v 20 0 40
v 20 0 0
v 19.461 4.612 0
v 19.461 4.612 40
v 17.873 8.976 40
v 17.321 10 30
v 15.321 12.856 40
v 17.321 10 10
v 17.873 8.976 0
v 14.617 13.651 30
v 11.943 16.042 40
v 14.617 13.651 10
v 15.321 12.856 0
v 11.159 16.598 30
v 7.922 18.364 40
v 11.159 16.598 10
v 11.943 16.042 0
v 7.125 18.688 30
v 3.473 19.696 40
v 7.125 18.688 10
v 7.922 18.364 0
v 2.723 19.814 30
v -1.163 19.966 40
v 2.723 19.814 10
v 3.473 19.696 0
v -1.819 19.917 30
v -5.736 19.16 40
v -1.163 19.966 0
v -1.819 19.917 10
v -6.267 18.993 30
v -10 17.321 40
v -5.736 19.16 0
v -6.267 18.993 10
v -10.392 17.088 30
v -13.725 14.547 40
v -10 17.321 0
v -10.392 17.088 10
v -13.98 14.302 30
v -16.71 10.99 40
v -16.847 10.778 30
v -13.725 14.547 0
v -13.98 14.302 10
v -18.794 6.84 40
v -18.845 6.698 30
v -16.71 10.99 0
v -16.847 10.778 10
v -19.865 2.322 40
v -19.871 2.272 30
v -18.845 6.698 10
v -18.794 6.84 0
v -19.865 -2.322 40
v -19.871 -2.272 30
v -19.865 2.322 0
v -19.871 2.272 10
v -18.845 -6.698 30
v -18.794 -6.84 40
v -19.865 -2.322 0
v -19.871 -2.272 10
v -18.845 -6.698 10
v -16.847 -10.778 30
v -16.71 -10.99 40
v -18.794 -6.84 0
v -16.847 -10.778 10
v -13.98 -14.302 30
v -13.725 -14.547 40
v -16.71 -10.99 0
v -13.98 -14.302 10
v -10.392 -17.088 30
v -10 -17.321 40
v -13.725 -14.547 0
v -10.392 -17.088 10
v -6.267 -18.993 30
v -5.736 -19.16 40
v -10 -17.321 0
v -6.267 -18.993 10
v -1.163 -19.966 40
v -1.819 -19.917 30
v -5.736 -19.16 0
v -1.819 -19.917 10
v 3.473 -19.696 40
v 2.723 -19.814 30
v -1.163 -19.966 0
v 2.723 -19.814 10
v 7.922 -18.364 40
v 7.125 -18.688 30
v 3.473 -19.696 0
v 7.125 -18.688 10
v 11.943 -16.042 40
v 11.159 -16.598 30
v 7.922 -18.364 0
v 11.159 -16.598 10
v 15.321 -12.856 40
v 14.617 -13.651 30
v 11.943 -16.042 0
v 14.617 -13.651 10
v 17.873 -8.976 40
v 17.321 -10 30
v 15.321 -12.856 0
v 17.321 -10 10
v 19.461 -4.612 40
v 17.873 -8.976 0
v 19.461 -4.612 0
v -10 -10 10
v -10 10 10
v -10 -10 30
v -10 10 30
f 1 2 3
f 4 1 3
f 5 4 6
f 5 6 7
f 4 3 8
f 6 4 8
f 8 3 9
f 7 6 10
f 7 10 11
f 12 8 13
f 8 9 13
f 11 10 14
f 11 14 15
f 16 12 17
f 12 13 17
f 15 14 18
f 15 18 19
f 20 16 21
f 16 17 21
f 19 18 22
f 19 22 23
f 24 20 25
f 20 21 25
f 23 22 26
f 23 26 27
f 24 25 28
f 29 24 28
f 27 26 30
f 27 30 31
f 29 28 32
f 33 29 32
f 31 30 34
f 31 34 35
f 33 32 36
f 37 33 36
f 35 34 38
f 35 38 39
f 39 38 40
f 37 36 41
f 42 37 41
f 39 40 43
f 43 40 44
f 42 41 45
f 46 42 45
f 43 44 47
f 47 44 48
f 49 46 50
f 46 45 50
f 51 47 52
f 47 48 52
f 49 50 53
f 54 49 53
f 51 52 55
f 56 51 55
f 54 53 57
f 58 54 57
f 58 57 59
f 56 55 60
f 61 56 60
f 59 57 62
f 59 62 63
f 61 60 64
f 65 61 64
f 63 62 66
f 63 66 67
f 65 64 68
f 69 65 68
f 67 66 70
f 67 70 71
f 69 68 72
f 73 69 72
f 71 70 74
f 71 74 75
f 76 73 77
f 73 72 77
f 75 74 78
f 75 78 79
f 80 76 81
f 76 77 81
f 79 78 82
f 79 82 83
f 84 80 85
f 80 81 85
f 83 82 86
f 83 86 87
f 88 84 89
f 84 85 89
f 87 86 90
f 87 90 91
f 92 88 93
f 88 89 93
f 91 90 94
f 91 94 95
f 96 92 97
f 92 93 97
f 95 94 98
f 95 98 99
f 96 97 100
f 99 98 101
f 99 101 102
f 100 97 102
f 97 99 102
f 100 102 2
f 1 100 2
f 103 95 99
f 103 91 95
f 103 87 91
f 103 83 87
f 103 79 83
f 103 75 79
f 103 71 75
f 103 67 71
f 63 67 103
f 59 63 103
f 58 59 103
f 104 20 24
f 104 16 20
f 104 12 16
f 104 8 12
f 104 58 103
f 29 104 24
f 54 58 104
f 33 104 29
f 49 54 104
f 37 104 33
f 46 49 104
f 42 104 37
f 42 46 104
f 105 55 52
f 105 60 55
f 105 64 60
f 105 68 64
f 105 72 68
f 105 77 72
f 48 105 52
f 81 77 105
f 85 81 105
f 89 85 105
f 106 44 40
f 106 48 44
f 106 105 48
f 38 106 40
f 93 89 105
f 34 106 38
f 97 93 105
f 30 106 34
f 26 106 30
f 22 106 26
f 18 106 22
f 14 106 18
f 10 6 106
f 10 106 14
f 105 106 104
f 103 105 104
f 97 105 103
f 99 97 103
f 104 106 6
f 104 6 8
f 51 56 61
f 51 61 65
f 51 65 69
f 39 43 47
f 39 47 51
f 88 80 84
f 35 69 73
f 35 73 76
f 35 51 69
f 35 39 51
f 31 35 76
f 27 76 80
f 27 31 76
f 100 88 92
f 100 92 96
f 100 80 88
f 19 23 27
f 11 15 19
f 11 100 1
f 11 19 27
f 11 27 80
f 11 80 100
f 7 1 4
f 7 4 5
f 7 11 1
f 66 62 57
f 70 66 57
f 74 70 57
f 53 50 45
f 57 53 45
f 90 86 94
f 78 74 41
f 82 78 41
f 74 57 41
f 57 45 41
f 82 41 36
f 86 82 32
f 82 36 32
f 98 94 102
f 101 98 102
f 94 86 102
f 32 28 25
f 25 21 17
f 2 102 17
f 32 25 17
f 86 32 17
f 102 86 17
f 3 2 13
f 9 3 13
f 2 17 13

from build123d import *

# Parameters (mm, degrees)
SKETCH1_R               = 20
BOSS_EXTRUDE1_DEPTH     = 40
CUT_EXTRUDE1_DEPTH      = 40
CUT_EXTRUDE1_DEPTH_BACK = 40
SKETCH2_W               = 10
SKETCH2_H               = 20
CUT_EXTRUDE2_DEPTH      = 40
CUT_EXTRUDE2_DEPTH_BACK = 40
SKETCH3_W               = 20
SKETCH3_H               = 10


with BuildPart() as part:
    # Sketch1 → Boss-Extrude1 (new body)
    with BuildSketch(Plane.XY):
        Circle(SKETCH1_R)
    extrude(amount=BOSS_EXTRUDE1_DEPTH)

    # Sketch2 → Cut-Extrude1 (cut, two sides: drawn at the far end of the back side and taken through both)
    with BuildSketch(Plane(origin=(0, 0, 0), x_dir=(1, 0, 0), z_dir=(0, 1, 0)).offset(-CUT_EXTRUDE1_DEPTH_BACK)):
        with Locations((-15, -20)):
            Rectangle(SKETCH2_W, SKETCH2_H)
    extrude(amount=CUT_EXTRUDE1_DEPTH + CUT_EXTRUDE1_DEPTH_BACK, mode=Mode.SUBTRACT)

    # Sketch3 → Cut-Extrude2 (cut, two sides: drawn at the far end of the back side and taken through both)
    with BuildSketch(Plane(origin=(0, 0, 0), x_dir=(0, 0, -1), z_dir=(1, 0, 0)).offset(-CUT_EXTRUDE2_DEPTH_BACK)):
        with Locations((-20, 15)):
            Rectangle(SKETCH3_W, SKETCH3_H)
        with Locations((-20, -15)):
            Rectangle(SKETCH3_W, SKETCH3_H)
    extrude(amount=CUT_EXTRUDE2_DEPTH + CUT_EXTRUDE2_DEPTH_BACK, mode=Mode.SUBTRACT)


solid = part.part
